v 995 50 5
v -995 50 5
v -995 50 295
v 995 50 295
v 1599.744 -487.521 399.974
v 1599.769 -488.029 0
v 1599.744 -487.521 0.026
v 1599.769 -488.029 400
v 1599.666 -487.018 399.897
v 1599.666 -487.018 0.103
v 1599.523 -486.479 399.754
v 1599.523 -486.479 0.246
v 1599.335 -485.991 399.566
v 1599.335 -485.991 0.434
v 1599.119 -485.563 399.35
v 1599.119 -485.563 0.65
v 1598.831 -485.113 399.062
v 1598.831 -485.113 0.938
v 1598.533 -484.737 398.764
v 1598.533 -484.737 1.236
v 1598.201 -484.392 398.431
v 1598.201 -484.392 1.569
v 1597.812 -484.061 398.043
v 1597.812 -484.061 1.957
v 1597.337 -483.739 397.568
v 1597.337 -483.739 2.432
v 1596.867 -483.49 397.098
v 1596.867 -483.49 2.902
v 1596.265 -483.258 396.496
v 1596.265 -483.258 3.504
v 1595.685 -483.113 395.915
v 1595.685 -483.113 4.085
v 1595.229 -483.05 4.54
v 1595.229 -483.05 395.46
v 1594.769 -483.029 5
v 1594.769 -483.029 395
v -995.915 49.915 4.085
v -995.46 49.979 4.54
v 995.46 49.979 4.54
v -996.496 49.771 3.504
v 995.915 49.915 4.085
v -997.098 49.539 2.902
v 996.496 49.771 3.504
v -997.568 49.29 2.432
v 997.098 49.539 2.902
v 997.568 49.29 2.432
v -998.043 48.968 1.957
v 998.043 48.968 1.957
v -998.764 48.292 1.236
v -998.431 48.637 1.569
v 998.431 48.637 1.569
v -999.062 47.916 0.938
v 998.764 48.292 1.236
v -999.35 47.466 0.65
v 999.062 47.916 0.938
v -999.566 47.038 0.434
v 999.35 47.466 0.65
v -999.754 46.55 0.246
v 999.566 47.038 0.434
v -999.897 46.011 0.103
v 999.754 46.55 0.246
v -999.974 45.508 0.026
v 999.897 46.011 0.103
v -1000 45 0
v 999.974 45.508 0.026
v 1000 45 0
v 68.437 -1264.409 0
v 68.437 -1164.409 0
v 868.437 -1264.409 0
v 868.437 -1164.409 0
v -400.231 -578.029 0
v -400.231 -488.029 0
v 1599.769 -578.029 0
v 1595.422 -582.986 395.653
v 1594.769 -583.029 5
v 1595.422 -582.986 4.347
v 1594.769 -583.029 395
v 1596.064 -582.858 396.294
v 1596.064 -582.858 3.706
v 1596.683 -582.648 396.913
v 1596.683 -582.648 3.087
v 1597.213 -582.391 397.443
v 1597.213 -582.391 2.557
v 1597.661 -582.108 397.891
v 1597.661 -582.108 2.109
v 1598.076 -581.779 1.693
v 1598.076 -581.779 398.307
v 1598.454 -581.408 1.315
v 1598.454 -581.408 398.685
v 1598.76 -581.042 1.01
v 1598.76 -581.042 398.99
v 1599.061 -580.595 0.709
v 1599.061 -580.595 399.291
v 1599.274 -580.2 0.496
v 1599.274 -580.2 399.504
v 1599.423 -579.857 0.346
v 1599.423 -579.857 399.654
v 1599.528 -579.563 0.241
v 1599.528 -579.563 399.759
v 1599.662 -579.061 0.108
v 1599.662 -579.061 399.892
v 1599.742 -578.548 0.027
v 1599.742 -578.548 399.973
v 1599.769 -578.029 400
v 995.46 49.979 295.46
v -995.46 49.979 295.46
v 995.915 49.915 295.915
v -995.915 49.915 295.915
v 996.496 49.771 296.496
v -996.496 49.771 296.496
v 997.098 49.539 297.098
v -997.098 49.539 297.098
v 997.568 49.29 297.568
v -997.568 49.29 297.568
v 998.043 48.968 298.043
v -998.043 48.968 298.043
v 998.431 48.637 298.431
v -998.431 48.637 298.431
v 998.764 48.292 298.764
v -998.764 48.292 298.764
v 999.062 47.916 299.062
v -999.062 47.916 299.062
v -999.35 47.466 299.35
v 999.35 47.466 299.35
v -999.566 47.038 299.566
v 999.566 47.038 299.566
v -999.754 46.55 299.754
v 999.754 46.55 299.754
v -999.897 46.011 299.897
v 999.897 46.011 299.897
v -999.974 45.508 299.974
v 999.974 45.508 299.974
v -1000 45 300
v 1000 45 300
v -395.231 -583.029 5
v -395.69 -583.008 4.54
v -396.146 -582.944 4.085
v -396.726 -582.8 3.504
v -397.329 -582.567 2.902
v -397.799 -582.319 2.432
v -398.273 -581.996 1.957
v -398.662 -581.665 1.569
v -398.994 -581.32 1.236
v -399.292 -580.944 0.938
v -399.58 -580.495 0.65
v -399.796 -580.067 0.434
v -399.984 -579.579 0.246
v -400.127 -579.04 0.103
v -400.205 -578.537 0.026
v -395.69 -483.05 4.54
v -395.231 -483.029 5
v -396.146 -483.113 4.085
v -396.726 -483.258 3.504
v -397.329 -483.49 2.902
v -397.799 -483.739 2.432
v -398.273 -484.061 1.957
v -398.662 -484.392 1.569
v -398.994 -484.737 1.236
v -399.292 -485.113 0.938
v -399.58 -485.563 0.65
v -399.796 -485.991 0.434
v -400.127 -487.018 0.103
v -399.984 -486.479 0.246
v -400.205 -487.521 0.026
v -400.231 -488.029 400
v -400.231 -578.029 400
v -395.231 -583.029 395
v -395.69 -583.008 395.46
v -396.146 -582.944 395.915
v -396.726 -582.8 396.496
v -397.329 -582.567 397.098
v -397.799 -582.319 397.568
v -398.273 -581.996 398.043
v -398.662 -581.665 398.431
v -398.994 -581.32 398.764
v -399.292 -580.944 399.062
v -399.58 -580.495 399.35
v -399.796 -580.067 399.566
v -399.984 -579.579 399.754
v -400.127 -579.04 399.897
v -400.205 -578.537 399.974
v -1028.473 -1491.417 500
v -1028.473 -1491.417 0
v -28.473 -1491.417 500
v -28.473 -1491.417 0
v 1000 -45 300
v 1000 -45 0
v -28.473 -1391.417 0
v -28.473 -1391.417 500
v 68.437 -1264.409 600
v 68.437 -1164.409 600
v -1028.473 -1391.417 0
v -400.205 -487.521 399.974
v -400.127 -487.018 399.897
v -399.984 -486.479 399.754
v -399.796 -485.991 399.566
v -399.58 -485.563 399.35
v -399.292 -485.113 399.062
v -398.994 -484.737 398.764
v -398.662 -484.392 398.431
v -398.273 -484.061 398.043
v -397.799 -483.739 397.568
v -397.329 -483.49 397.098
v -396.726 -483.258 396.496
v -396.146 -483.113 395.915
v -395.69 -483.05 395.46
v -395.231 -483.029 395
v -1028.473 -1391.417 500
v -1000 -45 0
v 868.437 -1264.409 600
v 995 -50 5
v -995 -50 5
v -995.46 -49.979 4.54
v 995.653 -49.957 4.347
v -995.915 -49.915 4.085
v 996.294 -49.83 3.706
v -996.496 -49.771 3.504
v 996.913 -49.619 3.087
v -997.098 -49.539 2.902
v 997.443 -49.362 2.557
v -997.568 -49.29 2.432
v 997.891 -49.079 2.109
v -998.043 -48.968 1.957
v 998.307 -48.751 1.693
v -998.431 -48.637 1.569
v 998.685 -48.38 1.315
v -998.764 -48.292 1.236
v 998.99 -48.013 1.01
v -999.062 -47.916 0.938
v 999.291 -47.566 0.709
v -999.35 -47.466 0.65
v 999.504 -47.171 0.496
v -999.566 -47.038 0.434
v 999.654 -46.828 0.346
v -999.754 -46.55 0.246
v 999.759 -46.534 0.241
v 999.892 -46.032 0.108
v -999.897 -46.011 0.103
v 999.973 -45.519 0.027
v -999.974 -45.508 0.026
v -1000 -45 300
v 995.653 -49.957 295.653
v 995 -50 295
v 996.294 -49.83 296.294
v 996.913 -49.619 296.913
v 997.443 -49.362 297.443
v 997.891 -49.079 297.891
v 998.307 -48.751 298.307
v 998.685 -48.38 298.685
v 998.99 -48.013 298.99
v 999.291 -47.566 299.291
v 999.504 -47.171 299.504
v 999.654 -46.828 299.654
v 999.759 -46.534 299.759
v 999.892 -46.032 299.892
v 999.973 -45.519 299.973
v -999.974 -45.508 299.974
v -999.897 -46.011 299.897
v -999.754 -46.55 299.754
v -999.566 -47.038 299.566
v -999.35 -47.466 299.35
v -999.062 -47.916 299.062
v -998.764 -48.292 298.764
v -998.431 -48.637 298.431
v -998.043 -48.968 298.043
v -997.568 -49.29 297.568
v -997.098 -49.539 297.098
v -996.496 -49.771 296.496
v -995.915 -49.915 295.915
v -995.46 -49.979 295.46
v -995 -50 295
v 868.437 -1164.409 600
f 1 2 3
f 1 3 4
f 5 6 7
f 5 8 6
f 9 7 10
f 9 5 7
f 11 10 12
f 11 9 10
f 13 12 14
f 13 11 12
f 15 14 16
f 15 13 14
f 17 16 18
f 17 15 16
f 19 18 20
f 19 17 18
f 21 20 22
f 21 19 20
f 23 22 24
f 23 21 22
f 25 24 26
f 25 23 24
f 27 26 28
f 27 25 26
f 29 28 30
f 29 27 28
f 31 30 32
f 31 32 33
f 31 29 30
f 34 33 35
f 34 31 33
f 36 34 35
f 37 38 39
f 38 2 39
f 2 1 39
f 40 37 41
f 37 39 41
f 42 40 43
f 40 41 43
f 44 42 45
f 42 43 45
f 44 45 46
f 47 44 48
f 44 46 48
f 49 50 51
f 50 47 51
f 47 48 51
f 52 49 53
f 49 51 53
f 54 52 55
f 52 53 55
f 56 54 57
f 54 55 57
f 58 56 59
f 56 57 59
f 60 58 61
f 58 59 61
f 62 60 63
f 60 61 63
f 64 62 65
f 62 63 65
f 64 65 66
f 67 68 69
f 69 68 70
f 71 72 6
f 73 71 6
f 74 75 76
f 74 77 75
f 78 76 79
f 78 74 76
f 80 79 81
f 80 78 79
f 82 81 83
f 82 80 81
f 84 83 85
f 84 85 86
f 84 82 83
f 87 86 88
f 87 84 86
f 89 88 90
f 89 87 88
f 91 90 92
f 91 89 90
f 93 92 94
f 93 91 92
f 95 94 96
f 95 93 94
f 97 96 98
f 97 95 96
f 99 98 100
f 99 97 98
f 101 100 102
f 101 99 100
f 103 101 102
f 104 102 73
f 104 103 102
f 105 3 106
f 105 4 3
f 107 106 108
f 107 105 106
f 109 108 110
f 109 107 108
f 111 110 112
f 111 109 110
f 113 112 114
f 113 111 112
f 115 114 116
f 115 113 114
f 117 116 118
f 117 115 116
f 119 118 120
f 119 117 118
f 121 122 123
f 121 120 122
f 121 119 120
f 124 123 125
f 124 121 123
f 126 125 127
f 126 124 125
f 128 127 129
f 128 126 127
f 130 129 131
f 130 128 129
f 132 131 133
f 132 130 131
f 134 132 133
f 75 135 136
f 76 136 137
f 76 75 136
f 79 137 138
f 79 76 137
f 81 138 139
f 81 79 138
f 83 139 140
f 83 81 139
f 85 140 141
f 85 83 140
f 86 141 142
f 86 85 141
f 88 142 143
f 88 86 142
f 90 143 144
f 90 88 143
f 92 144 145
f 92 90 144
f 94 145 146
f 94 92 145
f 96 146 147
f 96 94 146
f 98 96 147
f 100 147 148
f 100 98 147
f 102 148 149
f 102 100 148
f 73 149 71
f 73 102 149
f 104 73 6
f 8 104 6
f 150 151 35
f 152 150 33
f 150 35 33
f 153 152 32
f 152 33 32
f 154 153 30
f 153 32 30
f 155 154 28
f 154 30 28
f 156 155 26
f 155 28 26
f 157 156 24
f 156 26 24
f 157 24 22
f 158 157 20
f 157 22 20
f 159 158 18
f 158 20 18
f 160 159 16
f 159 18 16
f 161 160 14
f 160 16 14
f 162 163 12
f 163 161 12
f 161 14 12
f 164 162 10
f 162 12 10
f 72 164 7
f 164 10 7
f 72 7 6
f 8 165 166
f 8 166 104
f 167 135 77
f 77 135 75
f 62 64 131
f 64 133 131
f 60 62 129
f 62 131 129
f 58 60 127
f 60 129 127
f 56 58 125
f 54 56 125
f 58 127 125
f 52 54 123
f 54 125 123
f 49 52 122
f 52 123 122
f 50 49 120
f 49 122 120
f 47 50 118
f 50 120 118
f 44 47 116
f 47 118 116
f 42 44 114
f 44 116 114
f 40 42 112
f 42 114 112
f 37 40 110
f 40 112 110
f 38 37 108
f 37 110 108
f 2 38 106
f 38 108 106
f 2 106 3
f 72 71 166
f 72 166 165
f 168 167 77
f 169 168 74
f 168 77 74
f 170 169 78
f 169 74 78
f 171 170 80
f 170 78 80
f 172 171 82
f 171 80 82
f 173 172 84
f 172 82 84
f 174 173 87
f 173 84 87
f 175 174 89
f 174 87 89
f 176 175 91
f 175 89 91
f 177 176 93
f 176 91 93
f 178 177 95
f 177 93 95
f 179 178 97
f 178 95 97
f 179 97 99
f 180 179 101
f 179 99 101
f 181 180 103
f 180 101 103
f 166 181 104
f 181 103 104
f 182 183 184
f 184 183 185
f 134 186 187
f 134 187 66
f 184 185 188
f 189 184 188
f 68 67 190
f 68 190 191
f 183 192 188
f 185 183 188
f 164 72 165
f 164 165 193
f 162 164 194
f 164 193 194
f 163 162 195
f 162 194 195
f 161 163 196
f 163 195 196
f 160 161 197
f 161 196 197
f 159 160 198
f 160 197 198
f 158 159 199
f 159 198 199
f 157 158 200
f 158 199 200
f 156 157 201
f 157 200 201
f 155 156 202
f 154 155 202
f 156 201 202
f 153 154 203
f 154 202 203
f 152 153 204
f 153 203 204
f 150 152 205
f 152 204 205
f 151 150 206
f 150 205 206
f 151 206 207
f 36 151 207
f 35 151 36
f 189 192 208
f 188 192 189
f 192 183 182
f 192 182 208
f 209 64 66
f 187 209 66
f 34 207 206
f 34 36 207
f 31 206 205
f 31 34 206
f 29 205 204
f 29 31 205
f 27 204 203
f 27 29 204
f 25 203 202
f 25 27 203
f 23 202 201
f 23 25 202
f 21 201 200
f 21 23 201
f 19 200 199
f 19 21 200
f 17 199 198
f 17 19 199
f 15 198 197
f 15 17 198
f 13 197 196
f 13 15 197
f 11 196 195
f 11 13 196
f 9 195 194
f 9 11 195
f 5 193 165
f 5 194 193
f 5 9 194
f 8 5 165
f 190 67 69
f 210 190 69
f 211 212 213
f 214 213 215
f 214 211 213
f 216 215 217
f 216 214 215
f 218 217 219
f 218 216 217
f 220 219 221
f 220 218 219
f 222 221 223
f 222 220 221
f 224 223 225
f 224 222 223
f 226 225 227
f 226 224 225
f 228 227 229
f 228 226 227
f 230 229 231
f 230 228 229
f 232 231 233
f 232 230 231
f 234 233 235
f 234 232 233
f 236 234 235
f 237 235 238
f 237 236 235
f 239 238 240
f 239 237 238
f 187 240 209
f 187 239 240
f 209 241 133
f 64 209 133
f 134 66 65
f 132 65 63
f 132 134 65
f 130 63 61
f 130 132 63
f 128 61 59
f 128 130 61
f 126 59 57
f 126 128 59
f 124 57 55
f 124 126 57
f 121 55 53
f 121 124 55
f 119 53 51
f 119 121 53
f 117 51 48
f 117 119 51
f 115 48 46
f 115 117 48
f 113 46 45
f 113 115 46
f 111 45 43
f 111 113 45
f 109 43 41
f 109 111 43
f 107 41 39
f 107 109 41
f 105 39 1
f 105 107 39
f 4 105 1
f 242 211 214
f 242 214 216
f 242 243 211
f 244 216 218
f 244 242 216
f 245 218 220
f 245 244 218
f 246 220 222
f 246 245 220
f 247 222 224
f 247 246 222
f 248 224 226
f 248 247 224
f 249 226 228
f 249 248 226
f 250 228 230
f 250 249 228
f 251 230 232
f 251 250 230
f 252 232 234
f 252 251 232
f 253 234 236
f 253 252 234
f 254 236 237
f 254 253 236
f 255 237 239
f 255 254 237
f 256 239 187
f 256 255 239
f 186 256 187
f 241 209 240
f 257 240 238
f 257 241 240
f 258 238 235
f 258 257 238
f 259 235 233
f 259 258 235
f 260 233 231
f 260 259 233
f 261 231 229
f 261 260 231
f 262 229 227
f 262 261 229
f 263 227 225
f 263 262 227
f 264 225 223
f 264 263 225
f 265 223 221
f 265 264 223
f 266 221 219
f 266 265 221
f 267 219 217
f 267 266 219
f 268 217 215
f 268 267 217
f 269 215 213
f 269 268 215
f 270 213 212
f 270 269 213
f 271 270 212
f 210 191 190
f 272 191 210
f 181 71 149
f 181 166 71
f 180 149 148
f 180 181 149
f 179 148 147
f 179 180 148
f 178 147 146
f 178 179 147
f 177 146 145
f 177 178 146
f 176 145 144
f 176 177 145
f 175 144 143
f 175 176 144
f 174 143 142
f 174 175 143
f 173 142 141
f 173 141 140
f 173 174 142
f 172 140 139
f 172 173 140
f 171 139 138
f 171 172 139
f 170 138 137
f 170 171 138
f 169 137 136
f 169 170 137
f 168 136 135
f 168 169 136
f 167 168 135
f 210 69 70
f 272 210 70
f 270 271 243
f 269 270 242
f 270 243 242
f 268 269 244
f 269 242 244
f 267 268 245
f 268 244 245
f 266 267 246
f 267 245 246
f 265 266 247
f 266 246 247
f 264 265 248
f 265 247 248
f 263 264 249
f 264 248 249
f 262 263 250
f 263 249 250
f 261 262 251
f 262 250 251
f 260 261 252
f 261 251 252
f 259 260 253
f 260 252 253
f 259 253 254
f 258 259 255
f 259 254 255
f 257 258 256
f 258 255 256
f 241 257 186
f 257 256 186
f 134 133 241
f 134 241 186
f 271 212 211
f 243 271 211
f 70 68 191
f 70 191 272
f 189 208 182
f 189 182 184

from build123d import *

# Parameters (mm, degrees)
F0_W     = 2000
F0_H     = 100
F1_DEPTH = 300
F2_R     = 5
F3_W     = 2000
F3_H     = 100
F4_DEPTH = 400
F5_R     = 5
F6_W     = 800
F6_H     = 100
F7_DEPTH = 600
F8_W     = 1000
F8_H     = 100
F9_DEPTH = 500


with BuildPart() as f1:
    # F0 (on Top) → F1 (new body)
    with BuildSketch(Plane.XY):
        Rectangle(F0_W, F0_H)
    extrude(amount=F1_DEPTH)

    # F2
    f2_edges = [f1.edges().sort_by_distance(p)[0] for p in [
        (-1000, -50, 150),
        (1000, -50, 150),
        (0, -50, 0),
        (0, -50, 300),
        (1000, 50, 150),
        (-1000, 50, 150),
        (0, 50, 0),
        (0, 50, 300),
    ]]
    fillet(f2_edges, radius=F2_R)


with BuildPart() as f4:
    # F3 (on Top) → F4 (new body)
    with BuildSketch(Plane.XY):
        with Locations((599.769463, -533.028677)):
            Rectangle(F3_W, F3_H)
    extrude(amount=F4_DEPTH)

    # F5
    f5_edges = [f4.edges().sort_by_distance(p)[0] for p in [
        (-400.230537, -583.028677, 200),
        (1599.769463, -583.028677, 200),
        (599.769463, -583.028677, 0),
        (599.769463, -583.028677, 400),
        (1599.769463, -483.028677, 200),
        (-400.230537, -483.028677, 200),
        (599.769463, -483.028677, 0),
        (599.769463, -483.028677, 400),
    ]]
    fillet(f5_edges, radius=F5_R)


with BuildPart() as f7:
    # F6 (on Top) → F7 (new body)
    with BuildSketch(Plane.XY):
        with Locations((468.436748, -1214.408671)):
            Rectangle(F6_W, F6_H)
    extrude(amount=F7_DEPTH)


with BuildPart() as f9:
    # F8 (on Top) → F9 (new body)
    with BuildSketch(Plane.XY):
        with Locations((-528.473079, -1441.416586)):
            Rectangle(F8_W, F8_H)
    extrude(amount=F9_DEPTH)


solid = Compound([f1.part, f4.part, f7.part, f9.part])
